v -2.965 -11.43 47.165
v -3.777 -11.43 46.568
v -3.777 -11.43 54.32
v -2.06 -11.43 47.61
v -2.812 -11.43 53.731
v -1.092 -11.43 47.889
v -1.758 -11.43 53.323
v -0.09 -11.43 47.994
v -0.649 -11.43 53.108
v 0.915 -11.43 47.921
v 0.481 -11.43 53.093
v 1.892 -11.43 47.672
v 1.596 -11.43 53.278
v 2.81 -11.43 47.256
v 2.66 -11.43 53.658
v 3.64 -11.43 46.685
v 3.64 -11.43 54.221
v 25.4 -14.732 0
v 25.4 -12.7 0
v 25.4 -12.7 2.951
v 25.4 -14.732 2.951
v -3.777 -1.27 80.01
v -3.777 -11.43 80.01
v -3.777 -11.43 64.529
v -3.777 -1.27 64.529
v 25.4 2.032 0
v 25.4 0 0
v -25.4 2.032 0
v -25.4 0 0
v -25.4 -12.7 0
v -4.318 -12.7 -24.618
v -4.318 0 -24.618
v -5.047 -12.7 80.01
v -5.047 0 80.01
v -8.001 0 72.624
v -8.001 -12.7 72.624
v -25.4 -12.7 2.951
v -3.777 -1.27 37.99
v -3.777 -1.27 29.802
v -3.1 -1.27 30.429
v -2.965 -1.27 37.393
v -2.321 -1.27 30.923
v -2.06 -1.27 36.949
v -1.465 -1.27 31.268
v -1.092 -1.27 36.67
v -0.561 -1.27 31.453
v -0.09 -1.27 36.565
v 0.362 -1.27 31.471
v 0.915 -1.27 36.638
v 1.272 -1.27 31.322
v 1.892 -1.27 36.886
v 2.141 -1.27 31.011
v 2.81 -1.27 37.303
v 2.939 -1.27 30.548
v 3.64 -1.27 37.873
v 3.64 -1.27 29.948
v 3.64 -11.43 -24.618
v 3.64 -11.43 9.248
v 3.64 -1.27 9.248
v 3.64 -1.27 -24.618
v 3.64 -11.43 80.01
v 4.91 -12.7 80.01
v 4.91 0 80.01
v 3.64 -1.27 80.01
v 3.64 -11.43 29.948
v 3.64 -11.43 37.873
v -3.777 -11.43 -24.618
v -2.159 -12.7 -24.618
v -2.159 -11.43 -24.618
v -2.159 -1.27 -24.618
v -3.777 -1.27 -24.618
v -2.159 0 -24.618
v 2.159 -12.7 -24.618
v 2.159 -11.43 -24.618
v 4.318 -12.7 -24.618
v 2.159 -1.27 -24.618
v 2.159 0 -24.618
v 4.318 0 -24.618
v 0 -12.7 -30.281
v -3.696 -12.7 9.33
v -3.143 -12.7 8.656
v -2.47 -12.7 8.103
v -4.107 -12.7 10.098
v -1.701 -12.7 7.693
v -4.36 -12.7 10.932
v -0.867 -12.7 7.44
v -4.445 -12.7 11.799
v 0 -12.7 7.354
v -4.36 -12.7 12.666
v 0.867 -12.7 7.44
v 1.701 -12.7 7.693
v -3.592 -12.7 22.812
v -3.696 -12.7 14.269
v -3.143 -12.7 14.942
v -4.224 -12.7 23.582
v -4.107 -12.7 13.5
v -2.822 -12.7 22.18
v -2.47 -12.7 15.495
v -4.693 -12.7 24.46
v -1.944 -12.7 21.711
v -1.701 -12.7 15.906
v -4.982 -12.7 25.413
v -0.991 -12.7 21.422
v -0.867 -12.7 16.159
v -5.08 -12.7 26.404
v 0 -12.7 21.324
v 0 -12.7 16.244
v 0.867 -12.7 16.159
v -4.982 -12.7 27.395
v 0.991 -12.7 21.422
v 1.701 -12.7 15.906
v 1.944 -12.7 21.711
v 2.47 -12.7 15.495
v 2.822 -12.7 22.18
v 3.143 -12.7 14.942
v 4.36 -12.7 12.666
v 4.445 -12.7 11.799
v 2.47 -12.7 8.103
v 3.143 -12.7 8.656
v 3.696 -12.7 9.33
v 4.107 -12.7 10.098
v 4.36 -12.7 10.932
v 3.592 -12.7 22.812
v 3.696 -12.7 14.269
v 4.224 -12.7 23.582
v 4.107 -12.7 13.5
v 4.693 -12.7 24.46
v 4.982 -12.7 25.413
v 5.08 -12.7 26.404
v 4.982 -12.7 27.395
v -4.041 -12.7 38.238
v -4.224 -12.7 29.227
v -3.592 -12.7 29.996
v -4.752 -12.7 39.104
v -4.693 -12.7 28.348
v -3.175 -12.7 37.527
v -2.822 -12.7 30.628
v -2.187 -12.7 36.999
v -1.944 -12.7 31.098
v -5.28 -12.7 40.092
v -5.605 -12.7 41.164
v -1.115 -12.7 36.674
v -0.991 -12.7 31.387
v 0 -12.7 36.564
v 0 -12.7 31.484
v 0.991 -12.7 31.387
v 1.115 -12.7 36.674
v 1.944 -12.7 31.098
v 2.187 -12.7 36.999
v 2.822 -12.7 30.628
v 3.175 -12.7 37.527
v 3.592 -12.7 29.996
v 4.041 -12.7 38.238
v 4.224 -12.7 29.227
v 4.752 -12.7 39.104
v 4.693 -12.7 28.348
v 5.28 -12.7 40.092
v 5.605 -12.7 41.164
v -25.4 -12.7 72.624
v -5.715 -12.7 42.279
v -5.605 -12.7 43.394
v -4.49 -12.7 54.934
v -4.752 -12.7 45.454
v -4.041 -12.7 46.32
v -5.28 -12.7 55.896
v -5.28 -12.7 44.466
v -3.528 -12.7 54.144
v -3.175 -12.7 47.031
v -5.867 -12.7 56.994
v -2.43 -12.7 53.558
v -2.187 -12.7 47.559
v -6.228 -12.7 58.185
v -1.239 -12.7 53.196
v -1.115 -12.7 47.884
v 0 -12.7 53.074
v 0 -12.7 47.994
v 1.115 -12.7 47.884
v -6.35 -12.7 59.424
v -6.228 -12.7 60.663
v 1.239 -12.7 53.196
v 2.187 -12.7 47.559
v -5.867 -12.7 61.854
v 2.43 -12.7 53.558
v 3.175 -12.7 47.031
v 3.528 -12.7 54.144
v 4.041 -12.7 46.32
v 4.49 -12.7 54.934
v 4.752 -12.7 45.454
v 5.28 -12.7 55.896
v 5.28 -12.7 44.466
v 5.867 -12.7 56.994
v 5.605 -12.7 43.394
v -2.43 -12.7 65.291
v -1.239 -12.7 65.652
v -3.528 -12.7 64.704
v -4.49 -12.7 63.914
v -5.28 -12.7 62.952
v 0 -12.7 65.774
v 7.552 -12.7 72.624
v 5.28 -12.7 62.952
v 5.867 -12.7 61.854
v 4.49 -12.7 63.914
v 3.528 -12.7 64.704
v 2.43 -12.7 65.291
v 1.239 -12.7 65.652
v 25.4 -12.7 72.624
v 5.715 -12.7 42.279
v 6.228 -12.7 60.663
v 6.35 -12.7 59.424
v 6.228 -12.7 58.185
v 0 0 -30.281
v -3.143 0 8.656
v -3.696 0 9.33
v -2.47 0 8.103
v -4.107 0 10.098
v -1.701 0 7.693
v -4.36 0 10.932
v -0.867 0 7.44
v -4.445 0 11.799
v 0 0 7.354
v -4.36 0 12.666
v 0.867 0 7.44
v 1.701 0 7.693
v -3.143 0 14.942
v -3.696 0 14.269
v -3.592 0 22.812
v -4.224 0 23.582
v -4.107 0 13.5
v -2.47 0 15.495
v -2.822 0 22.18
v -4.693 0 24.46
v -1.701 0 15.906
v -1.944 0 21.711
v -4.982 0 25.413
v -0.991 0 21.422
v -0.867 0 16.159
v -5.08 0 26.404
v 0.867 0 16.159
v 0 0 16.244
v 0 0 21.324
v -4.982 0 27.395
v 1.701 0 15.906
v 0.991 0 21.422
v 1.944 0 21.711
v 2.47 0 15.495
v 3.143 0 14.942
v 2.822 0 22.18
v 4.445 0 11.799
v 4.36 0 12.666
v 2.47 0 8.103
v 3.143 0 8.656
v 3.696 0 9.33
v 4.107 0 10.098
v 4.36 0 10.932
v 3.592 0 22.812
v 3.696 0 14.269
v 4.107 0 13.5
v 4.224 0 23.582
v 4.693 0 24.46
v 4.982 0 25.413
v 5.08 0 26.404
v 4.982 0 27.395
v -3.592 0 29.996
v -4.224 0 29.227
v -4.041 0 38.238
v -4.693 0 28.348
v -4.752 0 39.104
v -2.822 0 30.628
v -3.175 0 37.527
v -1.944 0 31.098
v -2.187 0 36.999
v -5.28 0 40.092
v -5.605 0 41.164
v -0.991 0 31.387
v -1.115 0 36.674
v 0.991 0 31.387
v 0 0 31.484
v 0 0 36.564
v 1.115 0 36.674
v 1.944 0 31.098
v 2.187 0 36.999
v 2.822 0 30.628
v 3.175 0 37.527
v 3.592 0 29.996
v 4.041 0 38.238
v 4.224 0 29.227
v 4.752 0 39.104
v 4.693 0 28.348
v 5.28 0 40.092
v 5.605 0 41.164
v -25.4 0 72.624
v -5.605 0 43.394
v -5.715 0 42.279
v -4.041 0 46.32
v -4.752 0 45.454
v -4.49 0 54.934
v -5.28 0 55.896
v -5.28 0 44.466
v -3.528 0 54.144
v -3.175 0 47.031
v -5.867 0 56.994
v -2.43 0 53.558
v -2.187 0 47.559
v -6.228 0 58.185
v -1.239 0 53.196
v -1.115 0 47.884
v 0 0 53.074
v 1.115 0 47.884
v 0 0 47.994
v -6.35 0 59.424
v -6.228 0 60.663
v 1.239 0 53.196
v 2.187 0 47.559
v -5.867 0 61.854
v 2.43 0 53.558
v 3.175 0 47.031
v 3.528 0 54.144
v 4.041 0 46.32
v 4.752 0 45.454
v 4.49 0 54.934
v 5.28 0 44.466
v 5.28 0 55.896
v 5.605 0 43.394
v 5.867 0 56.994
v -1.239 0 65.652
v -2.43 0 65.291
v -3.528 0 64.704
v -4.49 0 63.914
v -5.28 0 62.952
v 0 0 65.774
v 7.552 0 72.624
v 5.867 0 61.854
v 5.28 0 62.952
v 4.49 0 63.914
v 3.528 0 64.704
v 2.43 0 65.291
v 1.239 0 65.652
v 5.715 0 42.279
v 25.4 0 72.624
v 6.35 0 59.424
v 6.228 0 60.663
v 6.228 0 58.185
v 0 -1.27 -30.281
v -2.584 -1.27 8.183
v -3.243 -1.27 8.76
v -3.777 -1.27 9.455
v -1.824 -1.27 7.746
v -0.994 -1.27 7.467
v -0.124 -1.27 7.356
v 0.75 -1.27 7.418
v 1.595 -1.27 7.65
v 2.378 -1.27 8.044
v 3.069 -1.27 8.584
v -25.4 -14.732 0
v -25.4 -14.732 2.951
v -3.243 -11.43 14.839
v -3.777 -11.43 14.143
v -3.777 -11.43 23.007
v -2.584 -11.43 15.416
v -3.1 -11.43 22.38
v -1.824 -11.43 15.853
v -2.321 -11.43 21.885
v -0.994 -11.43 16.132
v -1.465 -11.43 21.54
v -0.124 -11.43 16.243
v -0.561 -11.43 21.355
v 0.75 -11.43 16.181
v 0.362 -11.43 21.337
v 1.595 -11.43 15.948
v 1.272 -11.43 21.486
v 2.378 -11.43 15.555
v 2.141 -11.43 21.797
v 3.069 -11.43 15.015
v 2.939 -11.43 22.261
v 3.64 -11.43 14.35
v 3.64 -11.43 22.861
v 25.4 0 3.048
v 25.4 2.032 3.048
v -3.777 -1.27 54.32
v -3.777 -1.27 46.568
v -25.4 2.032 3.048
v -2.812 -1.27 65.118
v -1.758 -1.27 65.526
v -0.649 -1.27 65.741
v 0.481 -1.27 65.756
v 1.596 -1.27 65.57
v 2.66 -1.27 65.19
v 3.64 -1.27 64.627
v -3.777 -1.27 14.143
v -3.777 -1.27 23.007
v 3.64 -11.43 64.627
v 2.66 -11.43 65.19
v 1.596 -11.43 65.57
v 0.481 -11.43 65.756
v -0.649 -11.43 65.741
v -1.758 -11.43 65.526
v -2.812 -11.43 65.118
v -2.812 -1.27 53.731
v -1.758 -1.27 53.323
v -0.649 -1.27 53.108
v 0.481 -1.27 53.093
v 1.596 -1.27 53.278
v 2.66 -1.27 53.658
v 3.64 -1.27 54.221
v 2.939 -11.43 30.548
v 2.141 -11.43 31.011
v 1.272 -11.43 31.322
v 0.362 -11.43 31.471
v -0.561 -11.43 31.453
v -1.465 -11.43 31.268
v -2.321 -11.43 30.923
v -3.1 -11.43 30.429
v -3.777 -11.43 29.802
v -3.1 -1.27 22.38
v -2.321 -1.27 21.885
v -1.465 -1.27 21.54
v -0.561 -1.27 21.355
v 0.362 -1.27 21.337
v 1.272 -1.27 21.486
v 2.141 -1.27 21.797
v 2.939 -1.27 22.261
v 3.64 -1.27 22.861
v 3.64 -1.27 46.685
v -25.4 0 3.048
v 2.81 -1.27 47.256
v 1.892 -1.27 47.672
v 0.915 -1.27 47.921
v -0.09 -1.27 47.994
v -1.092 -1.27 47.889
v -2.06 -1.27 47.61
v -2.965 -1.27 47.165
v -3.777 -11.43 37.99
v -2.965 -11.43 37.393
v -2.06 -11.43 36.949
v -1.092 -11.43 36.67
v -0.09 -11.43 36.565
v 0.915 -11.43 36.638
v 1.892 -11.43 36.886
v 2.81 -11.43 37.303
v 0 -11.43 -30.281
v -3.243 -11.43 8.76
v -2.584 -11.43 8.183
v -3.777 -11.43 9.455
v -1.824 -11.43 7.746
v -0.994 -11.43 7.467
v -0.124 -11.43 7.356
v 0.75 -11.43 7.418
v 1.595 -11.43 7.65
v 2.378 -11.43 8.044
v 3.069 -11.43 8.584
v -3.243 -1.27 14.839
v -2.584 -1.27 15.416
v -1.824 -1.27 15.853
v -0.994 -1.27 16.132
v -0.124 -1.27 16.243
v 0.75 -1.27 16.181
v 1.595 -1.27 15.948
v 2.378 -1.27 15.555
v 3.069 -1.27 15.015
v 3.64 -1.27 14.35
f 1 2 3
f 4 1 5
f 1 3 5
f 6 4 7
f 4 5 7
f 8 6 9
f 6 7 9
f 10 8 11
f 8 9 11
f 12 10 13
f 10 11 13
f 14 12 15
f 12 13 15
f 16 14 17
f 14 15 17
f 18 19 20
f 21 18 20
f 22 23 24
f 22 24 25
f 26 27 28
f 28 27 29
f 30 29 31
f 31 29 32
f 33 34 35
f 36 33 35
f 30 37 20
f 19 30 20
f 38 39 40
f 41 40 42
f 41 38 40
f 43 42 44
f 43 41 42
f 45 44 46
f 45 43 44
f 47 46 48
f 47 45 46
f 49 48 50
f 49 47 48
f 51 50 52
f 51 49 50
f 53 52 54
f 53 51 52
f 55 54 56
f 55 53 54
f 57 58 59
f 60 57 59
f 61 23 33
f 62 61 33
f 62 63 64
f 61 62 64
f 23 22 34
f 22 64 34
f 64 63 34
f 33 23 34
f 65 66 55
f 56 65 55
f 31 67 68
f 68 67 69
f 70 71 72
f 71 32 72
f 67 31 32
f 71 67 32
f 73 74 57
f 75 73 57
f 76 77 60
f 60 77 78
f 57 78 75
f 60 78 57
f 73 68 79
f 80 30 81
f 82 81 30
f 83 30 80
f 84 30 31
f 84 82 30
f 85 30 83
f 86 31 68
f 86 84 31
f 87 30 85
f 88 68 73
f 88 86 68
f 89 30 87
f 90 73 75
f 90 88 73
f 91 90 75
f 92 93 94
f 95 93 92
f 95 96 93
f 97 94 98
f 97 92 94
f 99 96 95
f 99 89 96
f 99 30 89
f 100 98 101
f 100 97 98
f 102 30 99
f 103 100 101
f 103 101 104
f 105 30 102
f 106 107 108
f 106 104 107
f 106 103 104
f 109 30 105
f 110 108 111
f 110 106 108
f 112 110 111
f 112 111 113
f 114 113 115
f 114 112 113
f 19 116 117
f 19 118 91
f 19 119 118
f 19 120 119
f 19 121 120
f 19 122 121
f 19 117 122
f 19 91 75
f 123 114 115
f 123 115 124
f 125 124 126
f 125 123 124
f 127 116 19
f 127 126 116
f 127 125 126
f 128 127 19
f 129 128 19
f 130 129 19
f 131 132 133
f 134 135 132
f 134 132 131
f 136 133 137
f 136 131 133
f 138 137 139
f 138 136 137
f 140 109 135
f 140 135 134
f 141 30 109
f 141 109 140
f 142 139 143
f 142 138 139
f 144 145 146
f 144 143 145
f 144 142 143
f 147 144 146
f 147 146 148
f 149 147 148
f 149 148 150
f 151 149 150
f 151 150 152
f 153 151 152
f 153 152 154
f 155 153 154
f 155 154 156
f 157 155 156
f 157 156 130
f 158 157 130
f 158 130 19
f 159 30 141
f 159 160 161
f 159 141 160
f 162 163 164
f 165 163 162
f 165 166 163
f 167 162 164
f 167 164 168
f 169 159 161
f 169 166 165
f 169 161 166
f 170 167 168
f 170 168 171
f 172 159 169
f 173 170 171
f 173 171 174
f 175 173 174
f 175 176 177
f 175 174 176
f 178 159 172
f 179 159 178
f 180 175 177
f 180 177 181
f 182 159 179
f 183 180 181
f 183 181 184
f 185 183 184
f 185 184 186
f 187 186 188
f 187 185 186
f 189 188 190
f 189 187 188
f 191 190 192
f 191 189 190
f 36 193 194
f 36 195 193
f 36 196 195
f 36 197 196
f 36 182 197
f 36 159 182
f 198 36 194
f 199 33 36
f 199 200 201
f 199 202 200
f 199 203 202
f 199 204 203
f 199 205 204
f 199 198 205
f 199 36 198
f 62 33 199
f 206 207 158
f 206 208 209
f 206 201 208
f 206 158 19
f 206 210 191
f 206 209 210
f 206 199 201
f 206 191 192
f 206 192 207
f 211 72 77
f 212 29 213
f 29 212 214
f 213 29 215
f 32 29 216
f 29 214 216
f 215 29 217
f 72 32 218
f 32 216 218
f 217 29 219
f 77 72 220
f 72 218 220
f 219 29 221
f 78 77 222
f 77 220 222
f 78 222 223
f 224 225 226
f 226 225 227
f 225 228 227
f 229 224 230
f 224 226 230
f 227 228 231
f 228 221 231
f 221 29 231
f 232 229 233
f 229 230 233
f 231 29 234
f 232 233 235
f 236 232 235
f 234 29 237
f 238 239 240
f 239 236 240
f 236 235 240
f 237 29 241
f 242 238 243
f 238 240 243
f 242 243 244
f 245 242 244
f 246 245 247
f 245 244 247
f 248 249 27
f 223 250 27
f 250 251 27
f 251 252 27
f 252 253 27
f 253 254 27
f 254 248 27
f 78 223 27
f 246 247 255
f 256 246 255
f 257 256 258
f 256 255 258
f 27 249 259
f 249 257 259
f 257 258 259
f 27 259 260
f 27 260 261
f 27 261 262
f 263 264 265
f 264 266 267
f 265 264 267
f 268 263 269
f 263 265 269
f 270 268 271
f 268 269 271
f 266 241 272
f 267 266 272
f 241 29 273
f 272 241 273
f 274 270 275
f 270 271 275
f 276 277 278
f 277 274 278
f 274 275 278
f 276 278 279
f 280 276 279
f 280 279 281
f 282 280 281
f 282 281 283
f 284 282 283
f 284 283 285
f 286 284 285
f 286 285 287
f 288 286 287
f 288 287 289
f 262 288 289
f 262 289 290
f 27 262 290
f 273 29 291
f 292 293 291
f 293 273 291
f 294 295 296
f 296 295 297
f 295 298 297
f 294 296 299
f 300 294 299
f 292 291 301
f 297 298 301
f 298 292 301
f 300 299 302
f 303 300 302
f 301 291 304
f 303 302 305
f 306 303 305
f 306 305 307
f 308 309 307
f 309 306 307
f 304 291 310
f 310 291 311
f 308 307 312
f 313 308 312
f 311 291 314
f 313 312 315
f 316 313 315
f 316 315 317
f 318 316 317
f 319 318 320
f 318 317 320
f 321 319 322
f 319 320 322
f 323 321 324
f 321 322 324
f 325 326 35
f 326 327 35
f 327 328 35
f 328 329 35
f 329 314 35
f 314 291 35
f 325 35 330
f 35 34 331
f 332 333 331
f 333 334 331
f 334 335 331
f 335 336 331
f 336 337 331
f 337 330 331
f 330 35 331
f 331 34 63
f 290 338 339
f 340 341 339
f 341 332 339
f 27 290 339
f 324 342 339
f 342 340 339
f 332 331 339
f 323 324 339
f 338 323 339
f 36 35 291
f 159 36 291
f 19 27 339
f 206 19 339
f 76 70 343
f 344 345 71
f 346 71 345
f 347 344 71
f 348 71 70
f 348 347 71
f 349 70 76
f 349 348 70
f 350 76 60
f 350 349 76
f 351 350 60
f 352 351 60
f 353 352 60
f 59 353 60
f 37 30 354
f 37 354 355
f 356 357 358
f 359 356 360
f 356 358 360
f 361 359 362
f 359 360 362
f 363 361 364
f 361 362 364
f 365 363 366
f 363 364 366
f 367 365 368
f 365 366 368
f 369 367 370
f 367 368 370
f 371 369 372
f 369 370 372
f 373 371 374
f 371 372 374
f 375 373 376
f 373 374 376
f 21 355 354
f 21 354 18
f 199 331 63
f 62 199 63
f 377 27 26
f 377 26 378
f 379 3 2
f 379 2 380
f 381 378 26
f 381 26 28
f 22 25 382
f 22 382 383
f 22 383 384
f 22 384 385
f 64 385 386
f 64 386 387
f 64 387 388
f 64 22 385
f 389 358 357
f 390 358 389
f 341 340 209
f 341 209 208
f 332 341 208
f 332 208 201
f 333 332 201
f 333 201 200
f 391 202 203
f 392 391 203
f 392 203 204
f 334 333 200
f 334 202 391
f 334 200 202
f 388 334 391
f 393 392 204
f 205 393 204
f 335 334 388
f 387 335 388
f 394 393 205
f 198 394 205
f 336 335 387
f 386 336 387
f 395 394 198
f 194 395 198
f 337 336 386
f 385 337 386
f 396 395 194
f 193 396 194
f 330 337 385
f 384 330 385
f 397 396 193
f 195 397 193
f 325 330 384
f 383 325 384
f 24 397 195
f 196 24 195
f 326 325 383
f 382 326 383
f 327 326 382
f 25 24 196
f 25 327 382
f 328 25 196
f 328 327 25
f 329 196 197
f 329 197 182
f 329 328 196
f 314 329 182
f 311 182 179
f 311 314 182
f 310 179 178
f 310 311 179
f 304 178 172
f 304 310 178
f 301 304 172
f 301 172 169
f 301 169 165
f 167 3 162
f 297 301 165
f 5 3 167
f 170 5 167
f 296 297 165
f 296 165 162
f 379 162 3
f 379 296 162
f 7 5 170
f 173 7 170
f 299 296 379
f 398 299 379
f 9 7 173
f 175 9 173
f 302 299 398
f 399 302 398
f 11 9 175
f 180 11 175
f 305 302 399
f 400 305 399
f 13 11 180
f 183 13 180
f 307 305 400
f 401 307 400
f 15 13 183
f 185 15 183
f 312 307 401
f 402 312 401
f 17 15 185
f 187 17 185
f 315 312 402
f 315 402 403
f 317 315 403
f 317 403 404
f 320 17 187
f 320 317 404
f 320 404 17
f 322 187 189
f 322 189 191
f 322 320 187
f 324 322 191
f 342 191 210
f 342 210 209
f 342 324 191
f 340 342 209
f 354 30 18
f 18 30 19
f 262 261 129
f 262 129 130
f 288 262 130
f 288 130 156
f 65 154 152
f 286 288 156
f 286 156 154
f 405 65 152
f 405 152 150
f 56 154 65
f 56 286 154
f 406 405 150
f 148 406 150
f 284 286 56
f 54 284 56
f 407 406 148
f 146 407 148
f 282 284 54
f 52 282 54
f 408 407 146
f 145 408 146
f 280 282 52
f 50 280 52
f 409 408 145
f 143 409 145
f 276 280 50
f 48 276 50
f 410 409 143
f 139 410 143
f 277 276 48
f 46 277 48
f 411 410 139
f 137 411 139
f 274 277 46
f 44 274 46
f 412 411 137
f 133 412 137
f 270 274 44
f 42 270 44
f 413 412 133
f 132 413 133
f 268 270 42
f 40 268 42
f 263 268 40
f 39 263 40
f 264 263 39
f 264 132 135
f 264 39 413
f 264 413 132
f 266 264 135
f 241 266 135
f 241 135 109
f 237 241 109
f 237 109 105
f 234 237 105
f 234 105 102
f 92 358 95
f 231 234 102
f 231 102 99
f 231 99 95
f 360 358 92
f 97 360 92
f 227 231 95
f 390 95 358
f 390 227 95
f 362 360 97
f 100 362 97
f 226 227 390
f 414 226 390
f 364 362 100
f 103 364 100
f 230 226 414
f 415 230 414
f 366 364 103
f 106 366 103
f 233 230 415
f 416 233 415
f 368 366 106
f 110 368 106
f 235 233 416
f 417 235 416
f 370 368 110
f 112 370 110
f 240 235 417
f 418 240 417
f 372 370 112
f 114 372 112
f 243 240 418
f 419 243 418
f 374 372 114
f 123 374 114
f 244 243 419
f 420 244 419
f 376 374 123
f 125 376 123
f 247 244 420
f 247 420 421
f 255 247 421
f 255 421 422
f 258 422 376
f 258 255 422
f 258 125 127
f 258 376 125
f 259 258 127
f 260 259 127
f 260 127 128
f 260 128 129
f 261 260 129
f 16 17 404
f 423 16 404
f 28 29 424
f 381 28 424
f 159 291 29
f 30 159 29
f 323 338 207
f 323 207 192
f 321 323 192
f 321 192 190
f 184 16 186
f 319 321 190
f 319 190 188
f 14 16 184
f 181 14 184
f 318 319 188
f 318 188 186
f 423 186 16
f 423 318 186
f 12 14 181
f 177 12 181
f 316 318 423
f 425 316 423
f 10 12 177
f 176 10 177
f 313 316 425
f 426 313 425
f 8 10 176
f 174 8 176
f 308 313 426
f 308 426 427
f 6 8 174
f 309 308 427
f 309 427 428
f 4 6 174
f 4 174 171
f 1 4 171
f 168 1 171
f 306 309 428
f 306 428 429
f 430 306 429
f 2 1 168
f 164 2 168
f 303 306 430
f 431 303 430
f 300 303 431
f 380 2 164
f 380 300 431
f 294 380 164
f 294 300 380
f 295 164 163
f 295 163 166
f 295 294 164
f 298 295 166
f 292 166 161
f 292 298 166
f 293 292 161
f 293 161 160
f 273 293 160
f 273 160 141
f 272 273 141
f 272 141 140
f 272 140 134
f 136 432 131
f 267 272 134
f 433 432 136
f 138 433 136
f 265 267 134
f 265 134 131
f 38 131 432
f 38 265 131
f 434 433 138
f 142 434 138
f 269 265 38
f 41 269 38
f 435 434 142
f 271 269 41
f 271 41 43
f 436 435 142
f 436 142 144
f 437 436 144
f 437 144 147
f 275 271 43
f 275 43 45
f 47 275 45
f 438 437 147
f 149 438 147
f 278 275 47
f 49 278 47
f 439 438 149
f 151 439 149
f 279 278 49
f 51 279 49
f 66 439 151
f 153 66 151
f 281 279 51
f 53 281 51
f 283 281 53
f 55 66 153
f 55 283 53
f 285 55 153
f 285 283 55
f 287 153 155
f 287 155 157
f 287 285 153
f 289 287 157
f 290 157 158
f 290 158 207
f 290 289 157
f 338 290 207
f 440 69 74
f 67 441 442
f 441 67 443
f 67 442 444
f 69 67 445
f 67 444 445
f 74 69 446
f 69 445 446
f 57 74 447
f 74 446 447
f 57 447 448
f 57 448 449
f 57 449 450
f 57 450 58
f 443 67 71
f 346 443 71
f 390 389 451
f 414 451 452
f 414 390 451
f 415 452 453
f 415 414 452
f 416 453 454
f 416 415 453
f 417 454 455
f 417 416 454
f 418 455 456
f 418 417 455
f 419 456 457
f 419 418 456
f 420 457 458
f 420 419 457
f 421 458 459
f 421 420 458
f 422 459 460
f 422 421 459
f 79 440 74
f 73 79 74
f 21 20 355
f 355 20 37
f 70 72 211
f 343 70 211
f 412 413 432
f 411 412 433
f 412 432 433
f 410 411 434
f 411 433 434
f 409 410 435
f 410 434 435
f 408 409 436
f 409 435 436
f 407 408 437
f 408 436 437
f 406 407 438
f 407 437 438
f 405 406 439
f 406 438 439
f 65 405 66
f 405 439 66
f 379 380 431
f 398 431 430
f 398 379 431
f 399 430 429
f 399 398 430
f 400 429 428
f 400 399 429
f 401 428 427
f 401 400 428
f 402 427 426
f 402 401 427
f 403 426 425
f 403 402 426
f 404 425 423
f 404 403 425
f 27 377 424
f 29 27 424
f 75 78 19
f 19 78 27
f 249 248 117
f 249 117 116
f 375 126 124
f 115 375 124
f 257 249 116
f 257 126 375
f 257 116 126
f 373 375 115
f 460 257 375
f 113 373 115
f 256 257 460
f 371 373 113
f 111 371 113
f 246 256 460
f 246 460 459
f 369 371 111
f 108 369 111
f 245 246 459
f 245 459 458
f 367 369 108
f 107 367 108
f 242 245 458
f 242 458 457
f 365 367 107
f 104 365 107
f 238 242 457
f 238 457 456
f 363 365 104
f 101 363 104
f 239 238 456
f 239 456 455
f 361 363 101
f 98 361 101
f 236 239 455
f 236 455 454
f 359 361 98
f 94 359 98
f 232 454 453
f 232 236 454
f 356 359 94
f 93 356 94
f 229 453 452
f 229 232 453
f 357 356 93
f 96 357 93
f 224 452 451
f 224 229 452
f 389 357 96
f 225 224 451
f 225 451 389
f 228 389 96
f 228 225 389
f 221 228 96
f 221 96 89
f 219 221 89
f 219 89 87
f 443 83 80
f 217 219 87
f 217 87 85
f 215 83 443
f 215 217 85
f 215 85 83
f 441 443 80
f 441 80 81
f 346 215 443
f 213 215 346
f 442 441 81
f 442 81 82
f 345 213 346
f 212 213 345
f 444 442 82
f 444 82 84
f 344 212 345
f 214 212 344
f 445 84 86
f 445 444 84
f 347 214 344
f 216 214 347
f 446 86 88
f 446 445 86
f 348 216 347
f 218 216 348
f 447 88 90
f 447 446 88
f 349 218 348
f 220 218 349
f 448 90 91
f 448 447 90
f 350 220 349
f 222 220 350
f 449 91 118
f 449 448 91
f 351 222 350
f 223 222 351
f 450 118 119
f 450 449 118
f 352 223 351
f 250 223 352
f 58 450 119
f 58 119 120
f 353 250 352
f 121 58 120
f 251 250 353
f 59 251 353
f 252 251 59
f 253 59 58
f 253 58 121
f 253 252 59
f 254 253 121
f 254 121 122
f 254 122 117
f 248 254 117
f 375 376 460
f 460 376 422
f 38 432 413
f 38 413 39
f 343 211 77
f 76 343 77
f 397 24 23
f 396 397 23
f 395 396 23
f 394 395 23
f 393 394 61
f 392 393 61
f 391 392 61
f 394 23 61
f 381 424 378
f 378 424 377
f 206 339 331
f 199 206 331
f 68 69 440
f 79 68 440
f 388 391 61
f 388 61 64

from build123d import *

# Parameters (mm, degrees)
F0_R     = 4.445
F0_R_2   = 5.08
F0_R_3   = 5.715
F0_R_4   = 6.35
F1_DEPTH = 12.7
F2_W     = 7.416808
F2_H     = 10.16
F3_DEPTH = 127
F4_W     = 25.4
F4_H     = 2.950732
F5_DEPTH = 2.032
F6_W     = 25.4
F6_H     = 3.048
F7_DEPTH = 2.032


with BuildPart() as f1:
    # F0 (on Front) → F1 (new body)
    with BuildSketch(Plane.XZ):
        Polygon((-25.4, 0), (0, 0), (25.4, 0), (25.4, 72.62446), (7.551619, 72.62446), (-0.068381, 72.62446), (-8.001001, 72.62446), (-25.4, 72.62446), align=None)
        with Locations((0, 11.799281)):
            Circle(F0_R, mode=Mode.SUBTRACT)
        with Locations((0, 26.404281)):
            Circle(F0_R_2, mode=Mode.SUBTRACT)
        with Locations((0, 42.279281)):
            Circle(F0_R_3, mode=Mode.SUBTRACT)
        with Locations((0, 59.424281)):
            Circle(F0_R_4, mode=Mode.SUBTRACT)
        Polygon((-5.046785, 80.010004), (-8.001001, 72.62446), (-0.068381, 72.62446), (0, 80.010004), align=None)
        Polygon((-0.068381, 72.62446), (7.551619, 72.62446), (4.910023, 80.010004), (0, 80.010004), align=None)
        Polygon((25.4, 0), (0, 0), (-25.4, 0), (-4.318, -24.618464), (-2.159, -24.618464), (0, -24.618464), (2.159, -24.618464), (4.318, -24.618464), align=None)
        Polygon((0, -24.618464), (-2.159, -24.618464), (0, -30.280707), (2.159, -24.618464), align=None)
    extrude(amount=F1_DEPTH)

    # F2 (on face) → F3 (cut)
    with BuildSketch(Plane.XY.offset(80.010004)):
        with Locations((-0.068381, -6.35)):
            Rectangle(F2_W, F2_H)
    extrude(amount=-F3_DEPTH, mode=Mode.SUBTRACT)


with BuildPart() as f5:
    # F4 (on face) → F5 (new body)
    with BuildSketch(Plane.XZ.offset(12.7)):
        with Locations((-12.7, 1.475366)):
            Rectangle(F4_W, F4_H)
        with Locations((12.7, 1.475366)):
            Rectangle(F4_W, F4_H)
    extrude(amount=F5_DEPTH)


with BuildPart() as f7:
    # F6 (on face) → F7 (new body)
    with BuildSketch(Plane(origin=(0, 0, 0), x_dir=(-1, 0, 0), z_dir=(0, 1, 0))):
        with Locations((-12.7, 1.524)):
            Rectangle(F6_W, F6_H)
        with Locations((12.7, 1.524)):
            Rectangle(F6_W, F6_H)
    extrude(amount=F7_DEPTH)


solid = Compound([f1.part, f5.part, f7.part])
